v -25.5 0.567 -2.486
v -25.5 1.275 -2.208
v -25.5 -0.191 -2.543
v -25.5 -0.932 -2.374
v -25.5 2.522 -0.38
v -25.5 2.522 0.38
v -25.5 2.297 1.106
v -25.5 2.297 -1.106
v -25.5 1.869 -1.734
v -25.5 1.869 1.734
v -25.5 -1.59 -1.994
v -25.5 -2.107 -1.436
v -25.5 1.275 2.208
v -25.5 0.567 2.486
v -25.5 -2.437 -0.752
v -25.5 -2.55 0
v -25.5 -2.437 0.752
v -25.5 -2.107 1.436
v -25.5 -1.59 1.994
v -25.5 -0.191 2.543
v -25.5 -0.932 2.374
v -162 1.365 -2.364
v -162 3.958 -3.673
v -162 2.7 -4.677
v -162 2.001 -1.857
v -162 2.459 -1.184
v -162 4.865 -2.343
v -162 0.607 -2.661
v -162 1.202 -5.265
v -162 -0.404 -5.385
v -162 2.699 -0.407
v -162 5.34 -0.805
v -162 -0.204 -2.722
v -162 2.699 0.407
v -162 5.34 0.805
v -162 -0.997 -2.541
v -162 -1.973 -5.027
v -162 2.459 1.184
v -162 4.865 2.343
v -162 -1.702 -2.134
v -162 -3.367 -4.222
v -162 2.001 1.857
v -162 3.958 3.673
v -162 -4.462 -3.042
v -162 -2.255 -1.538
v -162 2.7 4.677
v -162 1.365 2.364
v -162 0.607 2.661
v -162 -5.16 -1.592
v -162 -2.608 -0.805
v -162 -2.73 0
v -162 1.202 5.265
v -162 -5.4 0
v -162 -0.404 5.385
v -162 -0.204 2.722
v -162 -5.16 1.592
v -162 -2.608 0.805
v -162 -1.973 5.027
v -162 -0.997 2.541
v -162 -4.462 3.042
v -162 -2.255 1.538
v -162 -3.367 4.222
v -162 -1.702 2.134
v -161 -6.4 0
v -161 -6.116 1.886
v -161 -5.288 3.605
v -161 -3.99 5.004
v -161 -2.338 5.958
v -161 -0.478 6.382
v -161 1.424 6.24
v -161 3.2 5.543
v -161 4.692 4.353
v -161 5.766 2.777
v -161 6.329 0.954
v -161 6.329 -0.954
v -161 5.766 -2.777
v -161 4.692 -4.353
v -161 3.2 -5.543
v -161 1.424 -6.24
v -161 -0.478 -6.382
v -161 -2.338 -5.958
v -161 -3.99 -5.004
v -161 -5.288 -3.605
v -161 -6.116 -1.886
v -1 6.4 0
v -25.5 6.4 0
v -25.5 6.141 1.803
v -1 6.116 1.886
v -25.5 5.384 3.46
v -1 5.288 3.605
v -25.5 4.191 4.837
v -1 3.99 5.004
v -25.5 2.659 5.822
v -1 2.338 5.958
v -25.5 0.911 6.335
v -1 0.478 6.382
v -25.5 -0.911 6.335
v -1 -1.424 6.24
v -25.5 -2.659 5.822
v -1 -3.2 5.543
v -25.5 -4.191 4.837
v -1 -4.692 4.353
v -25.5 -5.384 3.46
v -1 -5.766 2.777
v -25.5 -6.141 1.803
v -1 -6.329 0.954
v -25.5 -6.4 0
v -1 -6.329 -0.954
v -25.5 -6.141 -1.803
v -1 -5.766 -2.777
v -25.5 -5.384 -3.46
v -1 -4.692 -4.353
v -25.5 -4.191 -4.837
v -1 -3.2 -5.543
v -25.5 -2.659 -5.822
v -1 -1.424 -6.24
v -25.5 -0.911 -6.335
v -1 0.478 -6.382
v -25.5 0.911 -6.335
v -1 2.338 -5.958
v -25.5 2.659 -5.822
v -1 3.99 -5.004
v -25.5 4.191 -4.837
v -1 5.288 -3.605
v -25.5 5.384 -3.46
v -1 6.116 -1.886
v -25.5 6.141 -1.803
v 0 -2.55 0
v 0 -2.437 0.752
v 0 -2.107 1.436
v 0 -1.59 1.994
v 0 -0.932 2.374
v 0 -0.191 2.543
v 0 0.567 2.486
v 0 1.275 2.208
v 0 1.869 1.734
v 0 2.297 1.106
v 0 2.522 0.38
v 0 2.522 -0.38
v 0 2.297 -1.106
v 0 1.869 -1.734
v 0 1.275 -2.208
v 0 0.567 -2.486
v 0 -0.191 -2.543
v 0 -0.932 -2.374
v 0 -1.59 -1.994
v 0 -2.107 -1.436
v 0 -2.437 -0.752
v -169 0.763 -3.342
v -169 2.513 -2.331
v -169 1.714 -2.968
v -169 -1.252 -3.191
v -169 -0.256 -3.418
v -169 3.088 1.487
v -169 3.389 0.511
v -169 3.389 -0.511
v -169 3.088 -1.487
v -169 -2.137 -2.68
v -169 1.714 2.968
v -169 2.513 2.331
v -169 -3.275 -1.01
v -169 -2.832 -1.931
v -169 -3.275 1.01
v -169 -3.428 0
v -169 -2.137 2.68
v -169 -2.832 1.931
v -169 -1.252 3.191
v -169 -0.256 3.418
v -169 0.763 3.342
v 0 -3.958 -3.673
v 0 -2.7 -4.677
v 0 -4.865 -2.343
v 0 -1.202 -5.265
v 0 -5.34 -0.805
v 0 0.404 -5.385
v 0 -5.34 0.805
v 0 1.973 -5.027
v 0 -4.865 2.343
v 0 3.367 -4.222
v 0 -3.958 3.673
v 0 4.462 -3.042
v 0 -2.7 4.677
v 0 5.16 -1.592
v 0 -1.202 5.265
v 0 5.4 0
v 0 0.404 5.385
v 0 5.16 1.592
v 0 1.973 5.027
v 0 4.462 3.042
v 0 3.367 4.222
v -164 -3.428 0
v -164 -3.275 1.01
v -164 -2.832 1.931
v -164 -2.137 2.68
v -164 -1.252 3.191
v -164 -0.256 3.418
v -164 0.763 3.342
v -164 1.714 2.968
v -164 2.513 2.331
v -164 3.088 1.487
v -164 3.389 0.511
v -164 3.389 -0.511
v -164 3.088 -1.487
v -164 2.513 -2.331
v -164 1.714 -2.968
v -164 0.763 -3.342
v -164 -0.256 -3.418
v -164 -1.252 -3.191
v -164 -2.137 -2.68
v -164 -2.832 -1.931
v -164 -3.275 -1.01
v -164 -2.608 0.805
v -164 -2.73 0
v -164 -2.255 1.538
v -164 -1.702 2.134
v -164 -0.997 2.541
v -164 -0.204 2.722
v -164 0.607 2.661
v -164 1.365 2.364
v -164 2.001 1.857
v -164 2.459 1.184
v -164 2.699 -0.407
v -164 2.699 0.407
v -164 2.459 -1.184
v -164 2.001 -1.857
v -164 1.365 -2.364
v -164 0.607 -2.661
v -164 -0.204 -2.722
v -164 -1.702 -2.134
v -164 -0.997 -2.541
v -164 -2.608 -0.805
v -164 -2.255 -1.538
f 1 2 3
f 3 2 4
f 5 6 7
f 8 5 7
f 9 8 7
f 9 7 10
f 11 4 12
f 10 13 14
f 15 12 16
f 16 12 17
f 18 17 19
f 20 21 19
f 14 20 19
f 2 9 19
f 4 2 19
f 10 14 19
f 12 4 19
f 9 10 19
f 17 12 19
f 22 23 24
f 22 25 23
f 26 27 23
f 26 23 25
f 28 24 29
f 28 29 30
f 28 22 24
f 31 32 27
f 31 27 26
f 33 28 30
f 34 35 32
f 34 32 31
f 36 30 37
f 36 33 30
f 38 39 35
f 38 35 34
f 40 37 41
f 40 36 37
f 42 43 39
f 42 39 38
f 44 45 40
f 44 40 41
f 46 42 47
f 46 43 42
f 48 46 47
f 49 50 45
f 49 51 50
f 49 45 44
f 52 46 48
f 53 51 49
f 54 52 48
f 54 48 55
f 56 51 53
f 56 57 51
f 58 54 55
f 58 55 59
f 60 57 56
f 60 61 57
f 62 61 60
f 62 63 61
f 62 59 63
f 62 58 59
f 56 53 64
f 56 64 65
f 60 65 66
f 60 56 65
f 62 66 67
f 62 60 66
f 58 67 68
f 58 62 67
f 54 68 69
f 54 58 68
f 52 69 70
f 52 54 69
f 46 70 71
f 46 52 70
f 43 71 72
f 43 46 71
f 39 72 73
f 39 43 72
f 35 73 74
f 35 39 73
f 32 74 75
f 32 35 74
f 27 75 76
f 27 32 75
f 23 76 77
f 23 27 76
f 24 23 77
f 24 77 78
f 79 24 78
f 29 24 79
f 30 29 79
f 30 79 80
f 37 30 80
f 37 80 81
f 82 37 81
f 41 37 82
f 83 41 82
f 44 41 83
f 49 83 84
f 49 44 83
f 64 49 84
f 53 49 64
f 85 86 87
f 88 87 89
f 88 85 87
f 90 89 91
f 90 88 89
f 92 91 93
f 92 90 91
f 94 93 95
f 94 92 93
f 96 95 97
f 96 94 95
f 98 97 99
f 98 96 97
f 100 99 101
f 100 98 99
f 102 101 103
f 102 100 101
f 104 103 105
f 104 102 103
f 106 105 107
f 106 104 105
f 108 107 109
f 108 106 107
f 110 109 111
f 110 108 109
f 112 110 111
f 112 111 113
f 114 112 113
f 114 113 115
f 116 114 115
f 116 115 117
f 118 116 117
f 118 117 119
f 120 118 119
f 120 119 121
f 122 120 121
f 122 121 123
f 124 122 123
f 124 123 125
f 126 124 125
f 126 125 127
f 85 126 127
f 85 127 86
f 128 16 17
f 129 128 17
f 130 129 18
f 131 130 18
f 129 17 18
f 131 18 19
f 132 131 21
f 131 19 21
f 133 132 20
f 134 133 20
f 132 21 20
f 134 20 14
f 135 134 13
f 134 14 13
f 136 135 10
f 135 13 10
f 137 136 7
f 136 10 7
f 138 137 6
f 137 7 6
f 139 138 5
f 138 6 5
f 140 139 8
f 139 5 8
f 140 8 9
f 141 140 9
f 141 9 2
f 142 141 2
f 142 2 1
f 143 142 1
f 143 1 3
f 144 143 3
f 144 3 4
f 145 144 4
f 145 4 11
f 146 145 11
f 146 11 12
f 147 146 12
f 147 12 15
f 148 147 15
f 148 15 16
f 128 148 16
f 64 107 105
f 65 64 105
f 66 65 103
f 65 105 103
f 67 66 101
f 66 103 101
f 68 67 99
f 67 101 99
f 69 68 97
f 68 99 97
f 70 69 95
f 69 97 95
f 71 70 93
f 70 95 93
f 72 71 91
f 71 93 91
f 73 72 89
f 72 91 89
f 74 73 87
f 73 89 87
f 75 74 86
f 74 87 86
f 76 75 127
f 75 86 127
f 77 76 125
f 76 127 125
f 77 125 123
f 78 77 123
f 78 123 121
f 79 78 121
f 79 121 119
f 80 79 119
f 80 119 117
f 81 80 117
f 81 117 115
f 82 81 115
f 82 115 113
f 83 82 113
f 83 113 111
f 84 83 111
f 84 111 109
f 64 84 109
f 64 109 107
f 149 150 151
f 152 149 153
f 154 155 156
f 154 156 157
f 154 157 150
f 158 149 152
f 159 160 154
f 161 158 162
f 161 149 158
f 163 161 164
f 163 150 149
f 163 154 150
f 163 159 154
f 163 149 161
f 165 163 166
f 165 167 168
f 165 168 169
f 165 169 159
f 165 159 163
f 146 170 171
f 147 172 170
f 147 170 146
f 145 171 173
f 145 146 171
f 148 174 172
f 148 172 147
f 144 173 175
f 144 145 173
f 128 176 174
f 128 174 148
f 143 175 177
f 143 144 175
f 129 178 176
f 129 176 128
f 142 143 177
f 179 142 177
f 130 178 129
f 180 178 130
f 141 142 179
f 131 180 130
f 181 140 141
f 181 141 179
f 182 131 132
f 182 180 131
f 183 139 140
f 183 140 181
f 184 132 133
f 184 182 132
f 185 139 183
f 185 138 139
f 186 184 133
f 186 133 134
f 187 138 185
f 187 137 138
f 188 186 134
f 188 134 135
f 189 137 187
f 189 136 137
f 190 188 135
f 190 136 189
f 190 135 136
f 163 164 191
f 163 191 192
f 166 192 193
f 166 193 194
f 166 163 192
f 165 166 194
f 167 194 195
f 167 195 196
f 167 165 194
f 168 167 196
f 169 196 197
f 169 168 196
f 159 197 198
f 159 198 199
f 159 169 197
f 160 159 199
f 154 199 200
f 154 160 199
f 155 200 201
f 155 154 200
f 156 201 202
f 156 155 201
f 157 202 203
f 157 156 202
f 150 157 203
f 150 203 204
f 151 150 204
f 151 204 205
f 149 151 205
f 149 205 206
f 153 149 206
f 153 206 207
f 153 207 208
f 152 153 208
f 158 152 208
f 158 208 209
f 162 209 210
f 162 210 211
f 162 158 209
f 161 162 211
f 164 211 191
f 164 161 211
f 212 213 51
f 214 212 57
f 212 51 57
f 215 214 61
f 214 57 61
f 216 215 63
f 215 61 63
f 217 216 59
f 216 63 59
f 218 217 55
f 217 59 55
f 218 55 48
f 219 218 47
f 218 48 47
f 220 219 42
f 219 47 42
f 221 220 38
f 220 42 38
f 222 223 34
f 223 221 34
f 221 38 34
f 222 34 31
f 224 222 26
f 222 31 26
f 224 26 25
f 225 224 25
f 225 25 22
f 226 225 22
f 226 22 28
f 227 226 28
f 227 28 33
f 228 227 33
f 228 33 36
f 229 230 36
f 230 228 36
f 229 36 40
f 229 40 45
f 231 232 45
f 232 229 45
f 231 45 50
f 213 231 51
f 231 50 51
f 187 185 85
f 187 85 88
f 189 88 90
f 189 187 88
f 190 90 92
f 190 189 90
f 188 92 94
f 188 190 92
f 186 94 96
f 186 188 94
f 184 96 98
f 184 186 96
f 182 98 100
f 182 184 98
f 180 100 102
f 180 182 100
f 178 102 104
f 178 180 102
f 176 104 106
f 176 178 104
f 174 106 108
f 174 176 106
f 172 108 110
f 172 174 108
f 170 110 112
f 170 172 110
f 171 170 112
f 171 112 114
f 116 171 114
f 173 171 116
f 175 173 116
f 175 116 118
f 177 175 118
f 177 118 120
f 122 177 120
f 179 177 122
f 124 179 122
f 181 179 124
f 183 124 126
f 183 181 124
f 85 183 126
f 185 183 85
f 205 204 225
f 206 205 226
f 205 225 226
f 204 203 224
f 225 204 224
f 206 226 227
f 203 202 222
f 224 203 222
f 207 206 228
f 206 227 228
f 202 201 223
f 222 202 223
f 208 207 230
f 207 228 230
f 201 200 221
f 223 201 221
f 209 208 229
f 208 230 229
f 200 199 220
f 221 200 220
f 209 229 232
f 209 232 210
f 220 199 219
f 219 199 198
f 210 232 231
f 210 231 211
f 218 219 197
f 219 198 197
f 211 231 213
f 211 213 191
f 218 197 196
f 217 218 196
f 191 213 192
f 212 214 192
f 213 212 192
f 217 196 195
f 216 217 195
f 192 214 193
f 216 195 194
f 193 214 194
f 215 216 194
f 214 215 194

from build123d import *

# Parameters (mm, degrees)
F0_R      = 6.4
F1_DEPTH  = 25.5
F3_D      = 5.1
F4_R      = 6.4
F4_R_2    = 2.55
F5_DEPTH  = 136.5
F6_SIZE2  = 1
F6_SIZE   = 1
F7_R      = 2.7297634072
F8_DEPTH  = 7
F9_R      = 3.4275534108
F10_DEPTH = 5


with BuildPart() as f1:
    # F0 (on Right) → F1 (new body)
    with BuildSketch(Plane.YZ):
        Circle(F0_R)
    extrude(amount=-F1_DEPTH)

    # F3 (through all)
    with Locations(Plane.YZ):
        with Locations((0, 0)):
            Hole(F3_D / 2)

    # F4 (on face) → F5 (join)
    with BuildSketch(Plane(origin=(-25.5, 0, 0), x_dir=(0, -1, 0), z_dir=(-1, 0, 0))):
        Circle(F4_R)
        Circle(F4_R_2, mode=Mode.SUBTRACT)
        Circle(F4_R_2)
    extrude(amount=F5_DEPTH)

    # F6
    f6_edges = [f1.edges().sort_by_distance(p)[0] for p in [
        (0, -6.4, 0),
        (-12.75, 6.4, 0),
        (-25.5, 0, -6.4),
        (-25.5, 0, 6.4),
        (-93.75, -6.4, 0),
        (-162, 6.4, 0),
    ]]
    chamfer(f6_edges, length=F6_SIZE, length2=F6_SIZE2)

    # F7 (on face) → F8 (join)
    with BuildSketch(Plane(origin=(-162, 0, 0), x_dir=(0, -1, 0), z_dir=(-1, 0, 0))):
        Circle(F7_R)
    extrude(amount=F8_DEPTH)

    # F9 (on face) → F10 (join)
    with BuildSketch(Plane(origin=(-169, 0, 0), x_dir=(0, -1, 0), z_dir=(-1, 0, 0))):
        Circle(F9_R)
    extrude(amount=-F10_DEPTH)


solid = f1.part
